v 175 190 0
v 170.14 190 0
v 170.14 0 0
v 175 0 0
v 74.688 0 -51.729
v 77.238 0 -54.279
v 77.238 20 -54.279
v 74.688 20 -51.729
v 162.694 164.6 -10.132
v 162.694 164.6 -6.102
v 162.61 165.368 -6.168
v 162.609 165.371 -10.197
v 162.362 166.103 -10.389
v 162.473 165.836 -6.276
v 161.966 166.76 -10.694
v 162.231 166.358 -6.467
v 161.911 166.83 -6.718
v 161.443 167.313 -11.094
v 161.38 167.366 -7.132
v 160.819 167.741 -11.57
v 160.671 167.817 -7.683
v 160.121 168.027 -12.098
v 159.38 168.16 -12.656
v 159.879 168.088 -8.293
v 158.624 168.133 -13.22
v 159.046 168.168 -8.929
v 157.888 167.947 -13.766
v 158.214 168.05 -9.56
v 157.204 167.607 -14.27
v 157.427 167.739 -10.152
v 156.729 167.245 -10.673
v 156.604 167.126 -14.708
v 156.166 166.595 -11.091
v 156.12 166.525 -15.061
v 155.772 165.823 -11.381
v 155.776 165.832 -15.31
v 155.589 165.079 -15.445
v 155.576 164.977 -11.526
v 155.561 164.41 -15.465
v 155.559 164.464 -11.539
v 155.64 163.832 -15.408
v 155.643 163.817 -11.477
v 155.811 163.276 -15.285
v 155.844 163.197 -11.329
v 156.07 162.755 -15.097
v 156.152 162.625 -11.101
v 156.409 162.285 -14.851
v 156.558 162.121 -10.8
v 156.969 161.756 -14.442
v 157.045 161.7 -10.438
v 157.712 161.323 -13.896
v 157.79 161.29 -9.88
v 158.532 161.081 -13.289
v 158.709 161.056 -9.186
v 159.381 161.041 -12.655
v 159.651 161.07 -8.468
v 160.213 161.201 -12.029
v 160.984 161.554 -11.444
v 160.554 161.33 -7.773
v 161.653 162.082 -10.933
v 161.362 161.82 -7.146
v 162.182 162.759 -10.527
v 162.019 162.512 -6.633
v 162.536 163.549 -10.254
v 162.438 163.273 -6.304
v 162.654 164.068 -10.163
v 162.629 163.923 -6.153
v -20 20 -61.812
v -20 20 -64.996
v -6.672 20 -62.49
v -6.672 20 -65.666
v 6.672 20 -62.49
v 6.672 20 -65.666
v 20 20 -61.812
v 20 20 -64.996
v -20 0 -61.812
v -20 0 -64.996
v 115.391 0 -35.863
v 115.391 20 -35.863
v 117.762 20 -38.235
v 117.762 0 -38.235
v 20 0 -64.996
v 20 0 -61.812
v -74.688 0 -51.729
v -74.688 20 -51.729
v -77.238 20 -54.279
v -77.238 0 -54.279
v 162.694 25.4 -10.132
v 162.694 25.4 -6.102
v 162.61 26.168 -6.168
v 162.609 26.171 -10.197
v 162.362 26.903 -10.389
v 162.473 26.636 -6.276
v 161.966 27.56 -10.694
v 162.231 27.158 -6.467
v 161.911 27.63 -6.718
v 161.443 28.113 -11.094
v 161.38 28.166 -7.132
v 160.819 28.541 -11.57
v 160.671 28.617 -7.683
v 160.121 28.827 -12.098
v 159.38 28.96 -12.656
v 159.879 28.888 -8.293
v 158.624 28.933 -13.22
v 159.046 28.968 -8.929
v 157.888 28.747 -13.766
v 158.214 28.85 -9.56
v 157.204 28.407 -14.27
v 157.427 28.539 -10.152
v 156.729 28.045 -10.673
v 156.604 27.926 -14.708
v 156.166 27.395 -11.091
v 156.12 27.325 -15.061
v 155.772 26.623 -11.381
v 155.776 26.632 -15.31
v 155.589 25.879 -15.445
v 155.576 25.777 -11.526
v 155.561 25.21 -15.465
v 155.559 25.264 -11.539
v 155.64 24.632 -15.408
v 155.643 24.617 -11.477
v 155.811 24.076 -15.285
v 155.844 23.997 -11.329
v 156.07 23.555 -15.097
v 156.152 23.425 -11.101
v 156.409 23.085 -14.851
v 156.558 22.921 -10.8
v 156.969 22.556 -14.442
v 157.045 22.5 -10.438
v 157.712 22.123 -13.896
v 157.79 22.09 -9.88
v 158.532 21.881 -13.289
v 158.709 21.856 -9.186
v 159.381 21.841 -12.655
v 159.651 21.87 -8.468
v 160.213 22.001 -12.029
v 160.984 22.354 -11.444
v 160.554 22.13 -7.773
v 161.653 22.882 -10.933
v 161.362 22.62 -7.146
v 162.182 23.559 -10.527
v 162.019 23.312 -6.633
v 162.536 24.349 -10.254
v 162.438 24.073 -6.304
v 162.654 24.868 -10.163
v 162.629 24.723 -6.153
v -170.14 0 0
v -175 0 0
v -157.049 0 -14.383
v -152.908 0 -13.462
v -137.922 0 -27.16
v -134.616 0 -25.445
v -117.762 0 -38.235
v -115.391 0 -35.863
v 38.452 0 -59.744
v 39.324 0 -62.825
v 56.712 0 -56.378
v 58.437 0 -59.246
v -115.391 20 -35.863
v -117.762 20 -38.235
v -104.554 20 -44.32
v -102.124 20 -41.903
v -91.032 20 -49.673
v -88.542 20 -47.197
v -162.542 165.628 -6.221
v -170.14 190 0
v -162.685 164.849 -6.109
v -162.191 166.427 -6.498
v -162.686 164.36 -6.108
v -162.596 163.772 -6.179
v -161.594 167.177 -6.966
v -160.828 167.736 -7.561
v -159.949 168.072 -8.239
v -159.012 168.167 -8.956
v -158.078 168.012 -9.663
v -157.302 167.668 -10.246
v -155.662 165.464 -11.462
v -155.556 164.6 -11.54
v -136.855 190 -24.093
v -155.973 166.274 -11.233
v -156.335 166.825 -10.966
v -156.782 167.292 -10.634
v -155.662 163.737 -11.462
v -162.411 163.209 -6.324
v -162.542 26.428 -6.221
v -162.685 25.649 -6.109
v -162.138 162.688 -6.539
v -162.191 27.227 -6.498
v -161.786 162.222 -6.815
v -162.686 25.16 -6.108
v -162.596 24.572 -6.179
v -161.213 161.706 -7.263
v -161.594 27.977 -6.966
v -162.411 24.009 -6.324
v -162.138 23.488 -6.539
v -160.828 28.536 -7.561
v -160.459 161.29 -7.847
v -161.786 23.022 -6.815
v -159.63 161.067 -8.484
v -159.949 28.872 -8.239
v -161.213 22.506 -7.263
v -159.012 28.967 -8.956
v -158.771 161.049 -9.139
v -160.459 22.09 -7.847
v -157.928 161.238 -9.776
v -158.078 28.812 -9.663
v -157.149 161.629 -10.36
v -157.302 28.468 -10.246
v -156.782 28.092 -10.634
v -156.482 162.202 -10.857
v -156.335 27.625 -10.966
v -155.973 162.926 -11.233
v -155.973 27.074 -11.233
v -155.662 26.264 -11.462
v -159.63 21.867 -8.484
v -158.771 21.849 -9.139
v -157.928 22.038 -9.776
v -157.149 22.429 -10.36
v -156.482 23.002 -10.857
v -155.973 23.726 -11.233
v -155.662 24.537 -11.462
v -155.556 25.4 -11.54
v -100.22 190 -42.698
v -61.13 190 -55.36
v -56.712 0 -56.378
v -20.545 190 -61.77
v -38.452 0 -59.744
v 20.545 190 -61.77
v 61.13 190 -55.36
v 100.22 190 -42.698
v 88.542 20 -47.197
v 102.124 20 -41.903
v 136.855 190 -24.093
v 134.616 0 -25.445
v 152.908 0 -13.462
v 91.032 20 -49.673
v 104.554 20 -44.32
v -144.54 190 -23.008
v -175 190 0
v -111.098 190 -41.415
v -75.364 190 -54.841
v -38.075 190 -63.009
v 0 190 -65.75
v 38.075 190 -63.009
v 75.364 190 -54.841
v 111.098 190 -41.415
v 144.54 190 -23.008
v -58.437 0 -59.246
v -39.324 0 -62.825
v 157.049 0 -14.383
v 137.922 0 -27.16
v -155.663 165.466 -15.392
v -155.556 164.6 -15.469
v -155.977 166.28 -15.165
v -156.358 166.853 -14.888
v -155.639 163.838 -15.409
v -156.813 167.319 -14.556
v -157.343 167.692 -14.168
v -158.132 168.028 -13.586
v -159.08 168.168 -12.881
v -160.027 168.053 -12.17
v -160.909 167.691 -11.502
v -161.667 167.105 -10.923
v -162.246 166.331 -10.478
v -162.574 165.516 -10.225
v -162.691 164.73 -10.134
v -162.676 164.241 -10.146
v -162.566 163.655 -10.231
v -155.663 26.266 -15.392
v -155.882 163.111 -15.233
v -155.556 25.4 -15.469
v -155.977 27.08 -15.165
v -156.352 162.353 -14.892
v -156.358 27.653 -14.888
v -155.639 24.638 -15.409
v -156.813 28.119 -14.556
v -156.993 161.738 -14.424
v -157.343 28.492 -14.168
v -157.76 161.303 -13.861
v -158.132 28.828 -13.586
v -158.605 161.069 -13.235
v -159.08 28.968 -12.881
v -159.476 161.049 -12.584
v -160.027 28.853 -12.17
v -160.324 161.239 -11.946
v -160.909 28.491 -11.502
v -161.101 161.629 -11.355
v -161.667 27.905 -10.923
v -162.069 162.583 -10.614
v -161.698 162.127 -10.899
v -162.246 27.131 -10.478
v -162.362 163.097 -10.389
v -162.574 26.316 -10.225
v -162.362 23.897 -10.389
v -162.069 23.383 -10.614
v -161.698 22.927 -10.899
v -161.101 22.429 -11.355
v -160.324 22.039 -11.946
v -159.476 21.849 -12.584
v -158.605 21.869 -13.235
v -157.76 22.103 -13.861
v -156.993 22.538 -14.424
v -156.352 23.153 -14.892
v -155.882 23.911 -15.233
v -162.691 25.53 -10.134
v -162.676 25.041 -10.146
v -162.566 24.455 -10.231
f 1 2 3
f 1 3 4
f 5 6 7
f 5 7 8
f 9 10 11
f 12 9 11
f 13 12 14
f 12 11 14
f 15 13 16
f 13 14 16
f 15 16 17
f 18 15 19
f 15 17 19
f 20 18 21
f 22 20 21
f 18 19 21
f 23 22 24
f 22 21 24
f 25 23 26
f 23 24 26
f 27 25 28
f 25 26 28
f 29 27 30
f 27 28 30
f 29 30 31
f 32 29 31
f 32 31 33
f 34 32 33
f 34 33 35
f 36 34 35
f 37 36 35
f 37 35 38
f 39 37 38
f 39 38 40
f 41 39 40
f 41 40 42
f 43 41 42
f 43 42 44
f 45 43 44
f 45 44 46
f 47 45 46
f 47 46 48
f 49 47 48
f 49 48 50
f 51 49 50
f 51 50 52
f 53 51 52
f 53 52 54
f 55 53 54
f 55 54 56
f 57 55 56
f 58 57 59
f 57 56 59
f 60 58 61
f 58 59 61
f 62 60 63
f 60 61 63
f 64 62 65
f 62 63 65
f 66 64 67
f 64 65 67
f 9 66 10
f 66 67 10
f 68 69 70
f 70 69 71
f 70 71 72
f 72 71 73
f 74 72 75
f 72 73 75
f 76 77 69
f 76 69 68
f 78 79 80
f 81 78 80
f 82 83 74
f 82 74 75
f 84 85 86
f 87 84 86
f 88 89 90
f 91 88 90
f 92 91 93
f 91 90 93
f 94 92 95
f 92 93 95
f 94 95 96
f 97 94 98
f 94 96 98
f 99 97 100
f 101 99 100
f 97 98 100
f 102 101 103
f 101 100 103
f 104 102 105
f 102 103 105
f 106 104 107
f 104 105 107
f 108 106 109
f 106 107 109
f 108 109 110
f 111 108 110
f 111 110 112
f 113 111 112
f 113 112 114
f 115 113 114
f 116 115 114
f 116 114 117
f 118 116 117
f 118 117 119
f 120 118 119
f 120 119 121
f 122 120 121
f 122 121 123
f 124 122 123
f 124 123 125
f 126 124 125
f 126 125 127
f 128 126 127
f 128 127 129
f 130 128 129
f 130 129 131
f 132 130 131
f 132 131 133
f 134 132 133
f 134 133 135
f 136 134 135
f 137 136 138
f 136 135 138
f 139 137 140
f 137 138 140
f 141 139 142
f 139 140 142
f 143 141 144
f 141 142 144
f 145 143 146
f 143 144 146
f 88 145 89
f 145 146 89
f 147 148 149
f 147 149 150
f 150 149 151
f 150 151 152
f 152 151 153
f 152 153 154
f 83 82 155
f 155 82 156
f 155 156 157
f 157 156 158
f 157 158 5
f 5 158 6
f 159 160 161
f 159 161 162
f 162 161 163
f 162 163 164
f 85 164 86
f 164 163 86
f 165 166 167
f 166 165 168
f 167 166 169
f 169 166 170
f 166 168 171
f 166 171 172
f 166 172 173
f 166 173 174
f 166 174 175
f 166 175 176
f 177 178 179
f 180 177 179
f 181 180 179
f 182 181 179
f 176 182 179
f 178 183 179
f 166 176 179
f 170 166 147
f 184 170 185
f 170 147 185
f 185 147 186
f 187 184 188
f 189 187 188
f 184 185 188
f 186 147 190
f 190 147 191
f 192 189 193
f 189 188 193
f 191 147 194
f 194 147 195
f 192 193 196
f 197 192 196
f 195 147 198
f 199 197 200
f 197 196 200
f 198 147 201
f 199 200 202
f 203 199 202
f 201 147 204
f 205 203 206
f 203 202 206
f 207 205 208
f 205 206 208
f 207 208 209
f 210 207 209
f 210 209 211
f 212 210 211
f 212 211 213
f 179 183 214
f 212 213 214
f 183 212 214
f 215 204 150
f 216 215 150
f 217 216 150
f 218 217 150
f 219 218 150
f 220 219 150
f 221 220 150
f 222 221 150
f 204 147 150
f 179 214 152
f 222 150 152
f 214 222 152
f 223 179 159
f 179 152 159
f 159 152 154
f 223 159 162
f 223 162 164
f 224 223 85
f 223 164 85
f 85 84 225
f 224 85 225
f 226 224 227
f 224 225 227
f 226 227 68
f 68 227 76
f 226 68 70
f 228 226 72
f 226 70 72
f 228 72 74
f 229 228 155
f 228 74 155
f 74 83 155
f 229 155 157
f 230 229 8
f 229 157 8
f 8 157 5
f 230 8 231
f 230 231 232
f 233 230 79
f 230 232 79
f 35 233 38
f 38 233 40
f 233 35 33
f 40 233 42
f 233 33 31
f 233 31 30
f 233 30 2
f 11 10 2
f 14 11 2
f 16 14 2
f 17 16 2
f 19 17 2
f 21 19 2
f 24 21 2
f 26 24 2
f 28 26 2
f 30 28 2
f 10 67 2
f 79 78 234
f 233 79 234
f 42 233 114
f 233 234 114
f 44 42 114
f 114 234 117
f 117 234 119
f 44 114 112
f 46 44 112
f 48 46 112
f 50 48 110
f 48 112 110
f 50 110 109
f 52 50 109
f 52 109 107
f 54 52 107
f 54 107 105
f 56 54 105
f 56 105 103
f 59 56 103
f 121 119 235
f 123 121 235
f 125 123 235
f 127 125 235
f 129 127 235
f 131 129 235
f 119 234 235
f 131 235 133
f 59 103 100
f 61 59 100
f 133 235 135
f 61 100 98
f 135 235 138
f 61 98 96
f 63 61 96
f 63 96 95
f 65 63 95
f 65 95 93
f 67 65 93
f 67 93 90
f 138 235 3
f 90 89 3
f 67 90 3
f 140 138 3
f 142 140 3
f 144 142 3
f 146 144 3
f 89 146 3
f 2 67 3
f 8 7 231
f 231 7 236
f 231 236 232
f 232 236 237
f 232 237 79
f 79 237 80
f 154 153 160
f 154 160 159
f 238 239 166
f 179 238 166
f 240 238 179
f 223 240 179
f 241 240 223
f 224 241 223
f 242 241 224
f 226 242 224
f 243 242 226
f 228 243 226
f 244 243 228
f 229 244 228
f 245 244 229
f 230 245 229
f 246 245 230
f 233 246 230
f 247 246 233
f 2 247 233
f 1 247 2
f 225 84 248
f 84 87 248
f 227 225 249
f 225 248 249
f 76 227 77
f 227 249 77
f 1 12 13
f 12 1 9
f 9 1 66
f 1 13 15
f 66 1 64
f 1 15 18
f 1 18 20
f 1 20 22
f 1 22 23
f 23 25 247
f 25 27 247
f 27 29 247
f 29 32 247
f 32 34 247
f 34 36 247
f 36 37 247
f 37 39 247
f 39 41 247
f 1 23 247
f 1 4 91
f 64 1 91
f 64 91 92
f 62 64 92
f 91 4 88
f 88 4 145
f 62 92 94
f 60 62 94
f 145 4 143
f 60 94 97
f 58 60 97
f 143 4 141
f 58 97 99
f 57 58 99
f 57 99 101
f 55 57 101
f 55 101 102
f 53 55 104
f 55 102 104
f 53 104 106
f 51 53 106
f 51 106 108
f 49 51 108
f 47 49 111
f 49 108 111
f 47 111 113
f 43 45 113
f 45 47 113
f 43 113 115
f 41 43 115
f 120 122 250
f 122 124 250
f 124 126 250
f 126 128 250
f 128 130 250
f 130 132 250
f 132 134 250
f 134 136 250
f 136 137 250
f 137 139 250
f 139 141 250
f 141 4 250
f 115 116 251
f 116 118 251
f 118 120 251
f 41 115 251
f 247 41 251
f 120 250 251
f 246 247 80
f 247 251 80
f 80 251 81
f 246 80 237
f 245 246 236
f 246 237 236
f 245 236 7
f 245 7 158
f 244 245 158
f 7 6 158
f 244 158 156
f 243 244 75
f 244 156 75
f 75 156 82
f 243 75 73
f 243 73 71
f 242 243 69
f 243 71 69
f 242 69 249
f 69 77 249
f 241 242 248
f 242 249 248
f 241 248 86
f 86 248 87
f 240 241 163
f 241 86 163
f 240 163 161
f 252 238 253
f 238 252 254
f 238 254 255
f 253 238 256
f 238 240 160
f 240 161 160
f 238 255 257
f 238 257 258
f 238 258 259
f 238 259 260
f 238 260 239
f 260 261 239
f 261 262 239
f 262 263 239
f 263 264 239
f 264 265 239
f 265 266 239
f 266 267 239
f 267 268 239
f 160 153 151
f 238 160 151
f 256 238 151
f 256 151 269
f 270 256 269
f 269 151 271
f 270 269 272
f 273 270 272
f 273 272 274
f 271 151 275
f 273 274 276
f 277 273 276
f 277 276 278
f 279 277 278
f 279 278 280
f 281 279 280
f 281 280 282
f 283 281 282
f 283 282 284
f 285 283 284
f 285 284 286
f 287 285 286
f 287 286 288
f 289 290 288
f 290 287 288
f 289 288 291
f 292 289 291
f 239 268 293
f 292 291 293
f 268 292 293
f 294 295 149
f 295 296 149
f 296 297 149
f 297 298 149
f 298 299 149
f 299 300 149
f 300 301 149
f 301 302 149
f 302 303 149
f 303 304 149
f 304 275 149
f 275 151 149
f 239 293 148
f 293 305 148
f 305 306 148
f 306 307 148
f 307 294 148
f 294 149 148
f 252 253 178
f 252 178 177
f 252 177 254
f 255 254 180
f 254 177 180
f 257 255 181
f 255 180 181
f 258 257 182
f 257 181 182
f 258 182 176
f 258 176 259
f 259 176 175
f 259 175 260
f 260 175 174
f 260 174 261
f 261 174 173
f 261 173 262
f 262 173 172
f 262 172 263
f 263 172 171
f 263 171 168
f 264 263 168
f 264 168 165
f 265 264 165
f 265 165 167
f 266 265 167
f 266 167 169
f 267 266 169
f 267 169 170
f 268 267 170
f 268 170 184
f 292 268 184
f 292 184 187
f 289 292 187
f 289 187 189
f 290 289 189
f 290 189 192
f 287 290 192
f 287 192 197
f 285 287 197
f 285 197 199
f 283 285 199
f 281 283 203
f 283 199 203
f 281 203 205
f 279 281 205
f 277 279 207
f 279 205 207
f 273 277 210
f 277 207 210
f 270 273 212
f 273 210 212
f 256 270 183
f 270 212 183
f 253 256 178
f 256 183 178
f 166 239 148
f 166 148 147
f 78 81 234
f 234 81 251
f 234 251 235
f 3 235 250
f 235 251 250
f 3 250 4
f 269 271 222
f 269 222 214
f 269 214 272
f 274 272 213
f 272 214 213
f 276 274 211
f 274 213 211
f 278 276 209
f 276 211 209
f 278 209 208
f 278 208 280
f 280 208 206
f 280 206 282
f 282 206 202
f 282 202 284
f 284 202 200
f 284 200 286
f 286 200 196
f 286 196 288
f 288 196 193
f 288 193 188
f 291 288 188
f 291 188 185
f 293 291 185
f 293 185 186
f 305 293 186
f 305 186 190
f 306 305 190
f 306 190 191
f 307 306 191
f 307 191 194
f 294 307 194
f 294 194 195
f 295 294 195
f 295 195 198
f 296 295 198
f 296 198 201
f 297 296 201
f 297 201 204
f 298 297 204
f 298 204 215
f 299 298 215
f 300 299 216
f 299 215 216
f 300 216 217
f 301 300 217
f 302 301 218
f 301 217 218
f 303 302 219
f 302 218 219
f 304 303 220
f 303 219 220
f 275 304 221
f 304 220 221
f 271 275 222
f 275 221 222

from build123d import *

# Parameters (mm, degrees)
CURVED_PLATE_DEPTH   = 190
IR_CUTOUT_DEPTH      = 20
SKETCH3_R            = 3.5687
MOUNTING_HOLES_DEPTH = 66.75


with BuildPart() as part:
    # Sketch1 → Curved Plate (new body)
    with BuildSketch(Plane(origin=(0, 0, 0), x_dir=(1, 0, 0), z_dir=(0, 1, 0))):
        with BuildLine():
            Line((170.139573777, 0), (175, 0))
            ThreePointArc((175, 0), (0, 65.75), (-175, 0))
            Line((-175, 0), (-170.139573777, 0))
            ThreePointArc((-170.139573777, 0), (0, 62.575), (170.139573777, 0))
        make_face()
    extrude(amount=CURVED_PLATE_DEPTH)

    # Sketch2 → IR Cutout (cut)
    with BuildSketch(Plane(origin=(0, 0, 0), x_dir=(1, 0, 0), z_dir=(0, 1, 0))):
        with BuildLine():
            Line((-117.762328859, 38.234983169), (-105.521942389, 25.994596699))
            Line((-105.521942389, 25.994596699), (-101.986408483, 22.459062793))
            Line((-101.986408483, 22.459062793), (-73.702137236, 50.743334041))
            Line((-73.702137236, 50.743334041), (-77.237671141, 54.278867947))
            ThreePointArc((-77.237671141, 54.278867947), (-97.829451392, 47.089074697), (-117.762328859, 38.234983169))
        make_face()
        with BuildLine():
            Line((77.237671141, 54.278867947), (73.702137236, 50.743334041))
            Line((73.702137236, 50.743334041), (101.986408483, 22.459062793))
            Line((101.986408483, 22.459062793), (105.521942389, 25.994596699))
            Line((105.521942389, 25.994596699), (117.762328859, 38.234983169))
            ThreePointArc((117.762328859, 38.234983169), (97.829451392, 47.089074697), (77.237671141, 54.278867947))
        make_face()
        with BuildLine():
            Line((-20, 64.996386215), (-20, 59.996386215))
            Line((-20, 59.996386215), (20, 59.996386215))
            Line((20, 59.996386215), (20, 64.996386215))
            ThreePointArc((20, 64.996386215), (0, 65.75), (-20, 64.996386215))
        make_face()
    extrude(amount=IR_CUTOUT_DEPTH, mode=Mode.SUBTRACT)

    # Sketch3 → Mounting Holes (cut, through all)
    with BuildSketch(Plane.XY):
        with Locations((-159.125, 164.6)):
            Circle(SKETCH3_R)
        with Locations((-159.125, 25.4)):
            Circle(SKETCH3_R)
        with Locations((159.125, 25.4)):
            Circle(SKETCH3_R)
        with Locations((159.125, 164.6)):
            Circle(SKETCH3_R)
    extrude(amount=-MOUNTING_HOLES_DEPTH, mode=Mode.SUBTRACT)


solid = part.part
